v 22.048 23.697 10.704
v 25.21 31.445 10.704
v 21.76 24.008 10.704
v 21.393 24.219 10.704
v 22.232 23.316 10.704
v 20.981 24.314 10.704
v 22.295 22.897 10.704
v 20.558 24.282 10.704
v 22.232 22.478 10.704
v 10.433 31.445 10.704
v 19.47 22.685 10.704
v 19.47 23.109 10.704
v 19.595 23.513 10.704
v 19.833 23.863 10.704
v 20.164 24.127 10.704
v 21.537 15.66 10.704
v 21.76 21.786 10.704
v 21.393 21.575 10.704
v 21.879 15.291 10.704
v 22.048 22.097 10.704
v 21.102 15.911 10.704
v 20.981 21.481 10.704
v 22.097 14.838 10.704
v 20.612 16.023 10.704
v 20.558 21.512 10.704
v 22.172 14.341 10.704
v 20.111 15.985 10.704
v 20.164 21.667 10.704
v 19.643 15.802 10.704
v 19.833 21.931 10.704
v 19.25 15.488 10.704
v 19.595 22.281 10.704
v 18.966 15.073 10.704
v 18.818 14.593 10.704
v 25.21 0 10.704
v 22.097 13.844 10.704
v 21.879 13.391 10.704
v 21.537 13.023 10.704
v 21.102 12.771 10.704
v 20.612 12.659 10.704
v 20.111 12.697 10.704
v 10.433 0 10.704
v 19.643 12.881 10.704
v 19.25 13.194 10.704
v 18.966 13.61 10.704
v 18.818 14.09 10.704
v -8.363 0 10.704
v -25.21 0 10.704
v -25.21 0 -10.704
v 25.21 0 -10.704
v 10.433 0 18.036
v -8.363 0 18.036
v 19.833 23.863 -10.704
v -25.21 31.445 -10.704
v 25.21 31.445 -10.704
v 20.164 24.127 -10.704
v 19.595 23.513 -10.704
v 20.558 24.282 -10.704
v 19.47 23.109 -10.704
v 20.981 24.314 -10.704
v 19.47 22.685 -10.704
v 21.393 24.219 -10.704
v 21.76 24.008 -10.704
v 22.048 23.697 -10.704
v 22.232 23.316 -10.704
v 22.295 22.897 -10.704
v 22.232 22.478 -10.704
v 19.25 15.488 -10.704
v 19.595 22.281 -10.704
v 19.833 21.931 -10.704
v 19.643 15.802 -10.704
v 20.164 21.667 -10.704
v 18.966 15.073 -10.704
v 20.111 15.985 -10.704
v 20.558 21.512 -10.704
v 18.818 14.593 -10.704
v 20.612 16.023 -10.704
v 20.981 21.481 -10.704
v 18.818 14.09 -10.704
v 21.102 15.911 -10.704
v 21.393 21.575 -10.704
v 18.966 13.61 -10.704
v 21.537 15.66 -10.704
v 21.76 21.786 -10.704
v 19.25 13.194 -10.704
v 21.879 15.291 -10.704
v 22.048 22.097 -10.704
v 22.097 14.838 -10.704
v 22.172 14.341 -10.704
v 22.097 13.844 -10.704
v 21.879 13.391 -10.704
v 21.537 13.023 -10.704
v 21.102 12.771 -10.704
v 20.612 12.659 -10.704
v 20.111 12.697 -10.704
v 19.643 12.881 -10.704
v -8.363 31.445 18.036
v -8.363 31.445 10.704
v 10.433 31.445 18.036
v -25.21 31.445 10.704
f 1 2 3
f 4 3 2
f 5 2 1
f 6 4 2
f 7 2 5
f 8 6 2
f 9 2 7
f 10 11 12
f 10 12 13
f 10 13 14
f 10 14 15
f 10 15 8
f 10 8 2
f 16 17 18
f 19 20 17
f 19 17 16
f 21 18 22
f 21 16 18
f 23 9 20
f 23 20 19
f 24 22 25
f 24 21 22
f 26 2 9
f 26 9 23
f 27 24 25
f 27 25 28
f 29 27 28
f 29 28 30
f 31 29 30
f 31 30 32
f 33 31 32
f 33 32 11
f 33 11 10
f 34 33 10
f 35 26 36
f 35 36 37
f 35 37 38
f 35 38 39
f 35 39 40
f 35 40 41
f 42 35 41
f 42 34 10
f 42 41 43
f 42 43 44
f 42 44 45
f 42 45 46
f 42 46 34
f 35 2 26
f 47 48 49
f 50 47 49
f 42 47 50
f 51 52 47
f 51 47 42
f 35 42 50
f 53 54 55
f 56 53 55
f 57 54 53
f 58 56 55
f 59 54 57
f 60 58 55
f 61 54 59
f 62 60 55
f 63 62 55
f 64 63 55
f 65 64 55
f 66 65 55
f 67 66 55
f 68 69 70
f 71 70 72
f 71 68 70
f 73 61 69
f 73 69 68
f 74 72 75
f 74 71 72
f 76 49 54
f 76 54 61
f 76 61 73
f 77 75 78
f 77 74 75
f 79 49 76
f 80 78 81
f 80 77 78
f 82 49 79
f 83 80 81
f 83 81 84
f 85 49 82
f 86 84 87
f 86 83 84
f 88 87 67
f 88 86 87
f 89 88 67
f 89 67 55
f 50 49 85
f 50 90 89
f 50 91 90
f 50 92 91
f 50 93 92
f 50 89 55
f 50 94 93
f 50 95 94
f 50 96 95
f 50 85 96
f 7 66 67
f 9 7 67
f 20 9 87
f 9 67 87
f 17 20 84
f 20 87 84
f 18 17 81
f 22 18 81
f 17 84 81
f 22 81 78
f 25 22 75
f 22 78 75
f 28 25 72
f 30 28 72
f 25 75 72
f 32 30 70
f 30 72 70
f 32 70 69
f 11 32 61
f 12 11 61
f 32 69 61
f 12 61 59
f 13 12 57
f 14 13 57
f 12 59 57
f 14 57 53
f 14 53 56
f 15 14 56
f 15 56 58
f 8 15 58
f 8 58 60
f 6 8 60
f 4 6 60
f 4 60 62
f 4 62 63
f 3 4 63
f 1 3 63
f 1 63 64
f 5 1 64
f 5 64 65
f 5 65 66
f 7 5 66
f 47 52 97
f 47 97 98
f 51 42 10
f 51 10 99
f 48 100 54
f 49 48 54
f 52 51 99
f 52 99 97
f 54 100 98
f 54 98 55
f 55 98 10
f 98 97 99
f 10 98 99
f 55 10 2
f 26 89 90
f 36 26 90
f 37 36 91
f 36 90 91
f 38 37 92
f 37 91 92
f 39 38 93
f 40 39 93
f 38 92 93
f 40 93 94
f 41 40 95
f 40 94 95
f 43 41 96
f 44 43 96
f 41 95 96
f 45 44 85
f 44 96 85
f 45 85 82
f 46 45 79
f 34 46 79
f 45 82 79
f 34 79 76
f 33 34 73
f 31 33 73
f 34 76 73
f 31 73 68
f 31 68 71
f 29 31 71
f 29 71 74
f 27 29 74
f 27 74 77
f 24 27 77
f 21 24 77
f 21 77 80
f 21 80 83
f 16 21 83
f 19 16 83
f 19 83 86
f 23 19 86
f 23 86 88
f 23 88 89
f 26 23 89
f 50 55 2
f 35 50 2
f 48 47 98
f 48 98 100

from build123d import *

# Parameters (mm, degrees)
F1_DEPTH = 31.4452
F3_R     = 1.686467
F4_DEPTH = 25.4
F3_R_2   = 1.420474
F5_DEPTH = 25.4


with BuildPart() as f1:
    # F0 (on Front) → F1 (new body)
    with BuildSketch(Plane.XZ):
        Polygon((-8.363467, 10.70378), (-25.210224, 10.70378), (-25.210224, -10.70378), (25.210224, -10.70378), (25.210224, 10.70378), (10.432723, 10.70378), (10.432723, 18.035768), (-8.363467, 18.035768), align=None)
    extrude(amount=-F1_DEPTH)

    # F3 (on face) → F4 (cut)
    with BuildSketch(Plane(origin=(0, 0, -10.70378), x_dir=(1, 0, 0), z_dir=(0, 0, -1))):
        with Locations((20.485872, -14.341232)):
            Circle(F3_R)
    extrude(amount=-F4_DEPTH, mode=Mode.SUBTRACT)

    # F3 (on face) → F5 (cut)
    with BuildSketch(Plane(origin=(0, 0, -10.70378), x_dir=(1, 0, 0), z_dir=(0, 0, -1))):
        with Locations((20.874409, -22.897052)):
            Circle(F3_R_2)
    extrude(amount=-F5_DEPTH, mode=Mode.SUBTRACT)


solid = f1.part
